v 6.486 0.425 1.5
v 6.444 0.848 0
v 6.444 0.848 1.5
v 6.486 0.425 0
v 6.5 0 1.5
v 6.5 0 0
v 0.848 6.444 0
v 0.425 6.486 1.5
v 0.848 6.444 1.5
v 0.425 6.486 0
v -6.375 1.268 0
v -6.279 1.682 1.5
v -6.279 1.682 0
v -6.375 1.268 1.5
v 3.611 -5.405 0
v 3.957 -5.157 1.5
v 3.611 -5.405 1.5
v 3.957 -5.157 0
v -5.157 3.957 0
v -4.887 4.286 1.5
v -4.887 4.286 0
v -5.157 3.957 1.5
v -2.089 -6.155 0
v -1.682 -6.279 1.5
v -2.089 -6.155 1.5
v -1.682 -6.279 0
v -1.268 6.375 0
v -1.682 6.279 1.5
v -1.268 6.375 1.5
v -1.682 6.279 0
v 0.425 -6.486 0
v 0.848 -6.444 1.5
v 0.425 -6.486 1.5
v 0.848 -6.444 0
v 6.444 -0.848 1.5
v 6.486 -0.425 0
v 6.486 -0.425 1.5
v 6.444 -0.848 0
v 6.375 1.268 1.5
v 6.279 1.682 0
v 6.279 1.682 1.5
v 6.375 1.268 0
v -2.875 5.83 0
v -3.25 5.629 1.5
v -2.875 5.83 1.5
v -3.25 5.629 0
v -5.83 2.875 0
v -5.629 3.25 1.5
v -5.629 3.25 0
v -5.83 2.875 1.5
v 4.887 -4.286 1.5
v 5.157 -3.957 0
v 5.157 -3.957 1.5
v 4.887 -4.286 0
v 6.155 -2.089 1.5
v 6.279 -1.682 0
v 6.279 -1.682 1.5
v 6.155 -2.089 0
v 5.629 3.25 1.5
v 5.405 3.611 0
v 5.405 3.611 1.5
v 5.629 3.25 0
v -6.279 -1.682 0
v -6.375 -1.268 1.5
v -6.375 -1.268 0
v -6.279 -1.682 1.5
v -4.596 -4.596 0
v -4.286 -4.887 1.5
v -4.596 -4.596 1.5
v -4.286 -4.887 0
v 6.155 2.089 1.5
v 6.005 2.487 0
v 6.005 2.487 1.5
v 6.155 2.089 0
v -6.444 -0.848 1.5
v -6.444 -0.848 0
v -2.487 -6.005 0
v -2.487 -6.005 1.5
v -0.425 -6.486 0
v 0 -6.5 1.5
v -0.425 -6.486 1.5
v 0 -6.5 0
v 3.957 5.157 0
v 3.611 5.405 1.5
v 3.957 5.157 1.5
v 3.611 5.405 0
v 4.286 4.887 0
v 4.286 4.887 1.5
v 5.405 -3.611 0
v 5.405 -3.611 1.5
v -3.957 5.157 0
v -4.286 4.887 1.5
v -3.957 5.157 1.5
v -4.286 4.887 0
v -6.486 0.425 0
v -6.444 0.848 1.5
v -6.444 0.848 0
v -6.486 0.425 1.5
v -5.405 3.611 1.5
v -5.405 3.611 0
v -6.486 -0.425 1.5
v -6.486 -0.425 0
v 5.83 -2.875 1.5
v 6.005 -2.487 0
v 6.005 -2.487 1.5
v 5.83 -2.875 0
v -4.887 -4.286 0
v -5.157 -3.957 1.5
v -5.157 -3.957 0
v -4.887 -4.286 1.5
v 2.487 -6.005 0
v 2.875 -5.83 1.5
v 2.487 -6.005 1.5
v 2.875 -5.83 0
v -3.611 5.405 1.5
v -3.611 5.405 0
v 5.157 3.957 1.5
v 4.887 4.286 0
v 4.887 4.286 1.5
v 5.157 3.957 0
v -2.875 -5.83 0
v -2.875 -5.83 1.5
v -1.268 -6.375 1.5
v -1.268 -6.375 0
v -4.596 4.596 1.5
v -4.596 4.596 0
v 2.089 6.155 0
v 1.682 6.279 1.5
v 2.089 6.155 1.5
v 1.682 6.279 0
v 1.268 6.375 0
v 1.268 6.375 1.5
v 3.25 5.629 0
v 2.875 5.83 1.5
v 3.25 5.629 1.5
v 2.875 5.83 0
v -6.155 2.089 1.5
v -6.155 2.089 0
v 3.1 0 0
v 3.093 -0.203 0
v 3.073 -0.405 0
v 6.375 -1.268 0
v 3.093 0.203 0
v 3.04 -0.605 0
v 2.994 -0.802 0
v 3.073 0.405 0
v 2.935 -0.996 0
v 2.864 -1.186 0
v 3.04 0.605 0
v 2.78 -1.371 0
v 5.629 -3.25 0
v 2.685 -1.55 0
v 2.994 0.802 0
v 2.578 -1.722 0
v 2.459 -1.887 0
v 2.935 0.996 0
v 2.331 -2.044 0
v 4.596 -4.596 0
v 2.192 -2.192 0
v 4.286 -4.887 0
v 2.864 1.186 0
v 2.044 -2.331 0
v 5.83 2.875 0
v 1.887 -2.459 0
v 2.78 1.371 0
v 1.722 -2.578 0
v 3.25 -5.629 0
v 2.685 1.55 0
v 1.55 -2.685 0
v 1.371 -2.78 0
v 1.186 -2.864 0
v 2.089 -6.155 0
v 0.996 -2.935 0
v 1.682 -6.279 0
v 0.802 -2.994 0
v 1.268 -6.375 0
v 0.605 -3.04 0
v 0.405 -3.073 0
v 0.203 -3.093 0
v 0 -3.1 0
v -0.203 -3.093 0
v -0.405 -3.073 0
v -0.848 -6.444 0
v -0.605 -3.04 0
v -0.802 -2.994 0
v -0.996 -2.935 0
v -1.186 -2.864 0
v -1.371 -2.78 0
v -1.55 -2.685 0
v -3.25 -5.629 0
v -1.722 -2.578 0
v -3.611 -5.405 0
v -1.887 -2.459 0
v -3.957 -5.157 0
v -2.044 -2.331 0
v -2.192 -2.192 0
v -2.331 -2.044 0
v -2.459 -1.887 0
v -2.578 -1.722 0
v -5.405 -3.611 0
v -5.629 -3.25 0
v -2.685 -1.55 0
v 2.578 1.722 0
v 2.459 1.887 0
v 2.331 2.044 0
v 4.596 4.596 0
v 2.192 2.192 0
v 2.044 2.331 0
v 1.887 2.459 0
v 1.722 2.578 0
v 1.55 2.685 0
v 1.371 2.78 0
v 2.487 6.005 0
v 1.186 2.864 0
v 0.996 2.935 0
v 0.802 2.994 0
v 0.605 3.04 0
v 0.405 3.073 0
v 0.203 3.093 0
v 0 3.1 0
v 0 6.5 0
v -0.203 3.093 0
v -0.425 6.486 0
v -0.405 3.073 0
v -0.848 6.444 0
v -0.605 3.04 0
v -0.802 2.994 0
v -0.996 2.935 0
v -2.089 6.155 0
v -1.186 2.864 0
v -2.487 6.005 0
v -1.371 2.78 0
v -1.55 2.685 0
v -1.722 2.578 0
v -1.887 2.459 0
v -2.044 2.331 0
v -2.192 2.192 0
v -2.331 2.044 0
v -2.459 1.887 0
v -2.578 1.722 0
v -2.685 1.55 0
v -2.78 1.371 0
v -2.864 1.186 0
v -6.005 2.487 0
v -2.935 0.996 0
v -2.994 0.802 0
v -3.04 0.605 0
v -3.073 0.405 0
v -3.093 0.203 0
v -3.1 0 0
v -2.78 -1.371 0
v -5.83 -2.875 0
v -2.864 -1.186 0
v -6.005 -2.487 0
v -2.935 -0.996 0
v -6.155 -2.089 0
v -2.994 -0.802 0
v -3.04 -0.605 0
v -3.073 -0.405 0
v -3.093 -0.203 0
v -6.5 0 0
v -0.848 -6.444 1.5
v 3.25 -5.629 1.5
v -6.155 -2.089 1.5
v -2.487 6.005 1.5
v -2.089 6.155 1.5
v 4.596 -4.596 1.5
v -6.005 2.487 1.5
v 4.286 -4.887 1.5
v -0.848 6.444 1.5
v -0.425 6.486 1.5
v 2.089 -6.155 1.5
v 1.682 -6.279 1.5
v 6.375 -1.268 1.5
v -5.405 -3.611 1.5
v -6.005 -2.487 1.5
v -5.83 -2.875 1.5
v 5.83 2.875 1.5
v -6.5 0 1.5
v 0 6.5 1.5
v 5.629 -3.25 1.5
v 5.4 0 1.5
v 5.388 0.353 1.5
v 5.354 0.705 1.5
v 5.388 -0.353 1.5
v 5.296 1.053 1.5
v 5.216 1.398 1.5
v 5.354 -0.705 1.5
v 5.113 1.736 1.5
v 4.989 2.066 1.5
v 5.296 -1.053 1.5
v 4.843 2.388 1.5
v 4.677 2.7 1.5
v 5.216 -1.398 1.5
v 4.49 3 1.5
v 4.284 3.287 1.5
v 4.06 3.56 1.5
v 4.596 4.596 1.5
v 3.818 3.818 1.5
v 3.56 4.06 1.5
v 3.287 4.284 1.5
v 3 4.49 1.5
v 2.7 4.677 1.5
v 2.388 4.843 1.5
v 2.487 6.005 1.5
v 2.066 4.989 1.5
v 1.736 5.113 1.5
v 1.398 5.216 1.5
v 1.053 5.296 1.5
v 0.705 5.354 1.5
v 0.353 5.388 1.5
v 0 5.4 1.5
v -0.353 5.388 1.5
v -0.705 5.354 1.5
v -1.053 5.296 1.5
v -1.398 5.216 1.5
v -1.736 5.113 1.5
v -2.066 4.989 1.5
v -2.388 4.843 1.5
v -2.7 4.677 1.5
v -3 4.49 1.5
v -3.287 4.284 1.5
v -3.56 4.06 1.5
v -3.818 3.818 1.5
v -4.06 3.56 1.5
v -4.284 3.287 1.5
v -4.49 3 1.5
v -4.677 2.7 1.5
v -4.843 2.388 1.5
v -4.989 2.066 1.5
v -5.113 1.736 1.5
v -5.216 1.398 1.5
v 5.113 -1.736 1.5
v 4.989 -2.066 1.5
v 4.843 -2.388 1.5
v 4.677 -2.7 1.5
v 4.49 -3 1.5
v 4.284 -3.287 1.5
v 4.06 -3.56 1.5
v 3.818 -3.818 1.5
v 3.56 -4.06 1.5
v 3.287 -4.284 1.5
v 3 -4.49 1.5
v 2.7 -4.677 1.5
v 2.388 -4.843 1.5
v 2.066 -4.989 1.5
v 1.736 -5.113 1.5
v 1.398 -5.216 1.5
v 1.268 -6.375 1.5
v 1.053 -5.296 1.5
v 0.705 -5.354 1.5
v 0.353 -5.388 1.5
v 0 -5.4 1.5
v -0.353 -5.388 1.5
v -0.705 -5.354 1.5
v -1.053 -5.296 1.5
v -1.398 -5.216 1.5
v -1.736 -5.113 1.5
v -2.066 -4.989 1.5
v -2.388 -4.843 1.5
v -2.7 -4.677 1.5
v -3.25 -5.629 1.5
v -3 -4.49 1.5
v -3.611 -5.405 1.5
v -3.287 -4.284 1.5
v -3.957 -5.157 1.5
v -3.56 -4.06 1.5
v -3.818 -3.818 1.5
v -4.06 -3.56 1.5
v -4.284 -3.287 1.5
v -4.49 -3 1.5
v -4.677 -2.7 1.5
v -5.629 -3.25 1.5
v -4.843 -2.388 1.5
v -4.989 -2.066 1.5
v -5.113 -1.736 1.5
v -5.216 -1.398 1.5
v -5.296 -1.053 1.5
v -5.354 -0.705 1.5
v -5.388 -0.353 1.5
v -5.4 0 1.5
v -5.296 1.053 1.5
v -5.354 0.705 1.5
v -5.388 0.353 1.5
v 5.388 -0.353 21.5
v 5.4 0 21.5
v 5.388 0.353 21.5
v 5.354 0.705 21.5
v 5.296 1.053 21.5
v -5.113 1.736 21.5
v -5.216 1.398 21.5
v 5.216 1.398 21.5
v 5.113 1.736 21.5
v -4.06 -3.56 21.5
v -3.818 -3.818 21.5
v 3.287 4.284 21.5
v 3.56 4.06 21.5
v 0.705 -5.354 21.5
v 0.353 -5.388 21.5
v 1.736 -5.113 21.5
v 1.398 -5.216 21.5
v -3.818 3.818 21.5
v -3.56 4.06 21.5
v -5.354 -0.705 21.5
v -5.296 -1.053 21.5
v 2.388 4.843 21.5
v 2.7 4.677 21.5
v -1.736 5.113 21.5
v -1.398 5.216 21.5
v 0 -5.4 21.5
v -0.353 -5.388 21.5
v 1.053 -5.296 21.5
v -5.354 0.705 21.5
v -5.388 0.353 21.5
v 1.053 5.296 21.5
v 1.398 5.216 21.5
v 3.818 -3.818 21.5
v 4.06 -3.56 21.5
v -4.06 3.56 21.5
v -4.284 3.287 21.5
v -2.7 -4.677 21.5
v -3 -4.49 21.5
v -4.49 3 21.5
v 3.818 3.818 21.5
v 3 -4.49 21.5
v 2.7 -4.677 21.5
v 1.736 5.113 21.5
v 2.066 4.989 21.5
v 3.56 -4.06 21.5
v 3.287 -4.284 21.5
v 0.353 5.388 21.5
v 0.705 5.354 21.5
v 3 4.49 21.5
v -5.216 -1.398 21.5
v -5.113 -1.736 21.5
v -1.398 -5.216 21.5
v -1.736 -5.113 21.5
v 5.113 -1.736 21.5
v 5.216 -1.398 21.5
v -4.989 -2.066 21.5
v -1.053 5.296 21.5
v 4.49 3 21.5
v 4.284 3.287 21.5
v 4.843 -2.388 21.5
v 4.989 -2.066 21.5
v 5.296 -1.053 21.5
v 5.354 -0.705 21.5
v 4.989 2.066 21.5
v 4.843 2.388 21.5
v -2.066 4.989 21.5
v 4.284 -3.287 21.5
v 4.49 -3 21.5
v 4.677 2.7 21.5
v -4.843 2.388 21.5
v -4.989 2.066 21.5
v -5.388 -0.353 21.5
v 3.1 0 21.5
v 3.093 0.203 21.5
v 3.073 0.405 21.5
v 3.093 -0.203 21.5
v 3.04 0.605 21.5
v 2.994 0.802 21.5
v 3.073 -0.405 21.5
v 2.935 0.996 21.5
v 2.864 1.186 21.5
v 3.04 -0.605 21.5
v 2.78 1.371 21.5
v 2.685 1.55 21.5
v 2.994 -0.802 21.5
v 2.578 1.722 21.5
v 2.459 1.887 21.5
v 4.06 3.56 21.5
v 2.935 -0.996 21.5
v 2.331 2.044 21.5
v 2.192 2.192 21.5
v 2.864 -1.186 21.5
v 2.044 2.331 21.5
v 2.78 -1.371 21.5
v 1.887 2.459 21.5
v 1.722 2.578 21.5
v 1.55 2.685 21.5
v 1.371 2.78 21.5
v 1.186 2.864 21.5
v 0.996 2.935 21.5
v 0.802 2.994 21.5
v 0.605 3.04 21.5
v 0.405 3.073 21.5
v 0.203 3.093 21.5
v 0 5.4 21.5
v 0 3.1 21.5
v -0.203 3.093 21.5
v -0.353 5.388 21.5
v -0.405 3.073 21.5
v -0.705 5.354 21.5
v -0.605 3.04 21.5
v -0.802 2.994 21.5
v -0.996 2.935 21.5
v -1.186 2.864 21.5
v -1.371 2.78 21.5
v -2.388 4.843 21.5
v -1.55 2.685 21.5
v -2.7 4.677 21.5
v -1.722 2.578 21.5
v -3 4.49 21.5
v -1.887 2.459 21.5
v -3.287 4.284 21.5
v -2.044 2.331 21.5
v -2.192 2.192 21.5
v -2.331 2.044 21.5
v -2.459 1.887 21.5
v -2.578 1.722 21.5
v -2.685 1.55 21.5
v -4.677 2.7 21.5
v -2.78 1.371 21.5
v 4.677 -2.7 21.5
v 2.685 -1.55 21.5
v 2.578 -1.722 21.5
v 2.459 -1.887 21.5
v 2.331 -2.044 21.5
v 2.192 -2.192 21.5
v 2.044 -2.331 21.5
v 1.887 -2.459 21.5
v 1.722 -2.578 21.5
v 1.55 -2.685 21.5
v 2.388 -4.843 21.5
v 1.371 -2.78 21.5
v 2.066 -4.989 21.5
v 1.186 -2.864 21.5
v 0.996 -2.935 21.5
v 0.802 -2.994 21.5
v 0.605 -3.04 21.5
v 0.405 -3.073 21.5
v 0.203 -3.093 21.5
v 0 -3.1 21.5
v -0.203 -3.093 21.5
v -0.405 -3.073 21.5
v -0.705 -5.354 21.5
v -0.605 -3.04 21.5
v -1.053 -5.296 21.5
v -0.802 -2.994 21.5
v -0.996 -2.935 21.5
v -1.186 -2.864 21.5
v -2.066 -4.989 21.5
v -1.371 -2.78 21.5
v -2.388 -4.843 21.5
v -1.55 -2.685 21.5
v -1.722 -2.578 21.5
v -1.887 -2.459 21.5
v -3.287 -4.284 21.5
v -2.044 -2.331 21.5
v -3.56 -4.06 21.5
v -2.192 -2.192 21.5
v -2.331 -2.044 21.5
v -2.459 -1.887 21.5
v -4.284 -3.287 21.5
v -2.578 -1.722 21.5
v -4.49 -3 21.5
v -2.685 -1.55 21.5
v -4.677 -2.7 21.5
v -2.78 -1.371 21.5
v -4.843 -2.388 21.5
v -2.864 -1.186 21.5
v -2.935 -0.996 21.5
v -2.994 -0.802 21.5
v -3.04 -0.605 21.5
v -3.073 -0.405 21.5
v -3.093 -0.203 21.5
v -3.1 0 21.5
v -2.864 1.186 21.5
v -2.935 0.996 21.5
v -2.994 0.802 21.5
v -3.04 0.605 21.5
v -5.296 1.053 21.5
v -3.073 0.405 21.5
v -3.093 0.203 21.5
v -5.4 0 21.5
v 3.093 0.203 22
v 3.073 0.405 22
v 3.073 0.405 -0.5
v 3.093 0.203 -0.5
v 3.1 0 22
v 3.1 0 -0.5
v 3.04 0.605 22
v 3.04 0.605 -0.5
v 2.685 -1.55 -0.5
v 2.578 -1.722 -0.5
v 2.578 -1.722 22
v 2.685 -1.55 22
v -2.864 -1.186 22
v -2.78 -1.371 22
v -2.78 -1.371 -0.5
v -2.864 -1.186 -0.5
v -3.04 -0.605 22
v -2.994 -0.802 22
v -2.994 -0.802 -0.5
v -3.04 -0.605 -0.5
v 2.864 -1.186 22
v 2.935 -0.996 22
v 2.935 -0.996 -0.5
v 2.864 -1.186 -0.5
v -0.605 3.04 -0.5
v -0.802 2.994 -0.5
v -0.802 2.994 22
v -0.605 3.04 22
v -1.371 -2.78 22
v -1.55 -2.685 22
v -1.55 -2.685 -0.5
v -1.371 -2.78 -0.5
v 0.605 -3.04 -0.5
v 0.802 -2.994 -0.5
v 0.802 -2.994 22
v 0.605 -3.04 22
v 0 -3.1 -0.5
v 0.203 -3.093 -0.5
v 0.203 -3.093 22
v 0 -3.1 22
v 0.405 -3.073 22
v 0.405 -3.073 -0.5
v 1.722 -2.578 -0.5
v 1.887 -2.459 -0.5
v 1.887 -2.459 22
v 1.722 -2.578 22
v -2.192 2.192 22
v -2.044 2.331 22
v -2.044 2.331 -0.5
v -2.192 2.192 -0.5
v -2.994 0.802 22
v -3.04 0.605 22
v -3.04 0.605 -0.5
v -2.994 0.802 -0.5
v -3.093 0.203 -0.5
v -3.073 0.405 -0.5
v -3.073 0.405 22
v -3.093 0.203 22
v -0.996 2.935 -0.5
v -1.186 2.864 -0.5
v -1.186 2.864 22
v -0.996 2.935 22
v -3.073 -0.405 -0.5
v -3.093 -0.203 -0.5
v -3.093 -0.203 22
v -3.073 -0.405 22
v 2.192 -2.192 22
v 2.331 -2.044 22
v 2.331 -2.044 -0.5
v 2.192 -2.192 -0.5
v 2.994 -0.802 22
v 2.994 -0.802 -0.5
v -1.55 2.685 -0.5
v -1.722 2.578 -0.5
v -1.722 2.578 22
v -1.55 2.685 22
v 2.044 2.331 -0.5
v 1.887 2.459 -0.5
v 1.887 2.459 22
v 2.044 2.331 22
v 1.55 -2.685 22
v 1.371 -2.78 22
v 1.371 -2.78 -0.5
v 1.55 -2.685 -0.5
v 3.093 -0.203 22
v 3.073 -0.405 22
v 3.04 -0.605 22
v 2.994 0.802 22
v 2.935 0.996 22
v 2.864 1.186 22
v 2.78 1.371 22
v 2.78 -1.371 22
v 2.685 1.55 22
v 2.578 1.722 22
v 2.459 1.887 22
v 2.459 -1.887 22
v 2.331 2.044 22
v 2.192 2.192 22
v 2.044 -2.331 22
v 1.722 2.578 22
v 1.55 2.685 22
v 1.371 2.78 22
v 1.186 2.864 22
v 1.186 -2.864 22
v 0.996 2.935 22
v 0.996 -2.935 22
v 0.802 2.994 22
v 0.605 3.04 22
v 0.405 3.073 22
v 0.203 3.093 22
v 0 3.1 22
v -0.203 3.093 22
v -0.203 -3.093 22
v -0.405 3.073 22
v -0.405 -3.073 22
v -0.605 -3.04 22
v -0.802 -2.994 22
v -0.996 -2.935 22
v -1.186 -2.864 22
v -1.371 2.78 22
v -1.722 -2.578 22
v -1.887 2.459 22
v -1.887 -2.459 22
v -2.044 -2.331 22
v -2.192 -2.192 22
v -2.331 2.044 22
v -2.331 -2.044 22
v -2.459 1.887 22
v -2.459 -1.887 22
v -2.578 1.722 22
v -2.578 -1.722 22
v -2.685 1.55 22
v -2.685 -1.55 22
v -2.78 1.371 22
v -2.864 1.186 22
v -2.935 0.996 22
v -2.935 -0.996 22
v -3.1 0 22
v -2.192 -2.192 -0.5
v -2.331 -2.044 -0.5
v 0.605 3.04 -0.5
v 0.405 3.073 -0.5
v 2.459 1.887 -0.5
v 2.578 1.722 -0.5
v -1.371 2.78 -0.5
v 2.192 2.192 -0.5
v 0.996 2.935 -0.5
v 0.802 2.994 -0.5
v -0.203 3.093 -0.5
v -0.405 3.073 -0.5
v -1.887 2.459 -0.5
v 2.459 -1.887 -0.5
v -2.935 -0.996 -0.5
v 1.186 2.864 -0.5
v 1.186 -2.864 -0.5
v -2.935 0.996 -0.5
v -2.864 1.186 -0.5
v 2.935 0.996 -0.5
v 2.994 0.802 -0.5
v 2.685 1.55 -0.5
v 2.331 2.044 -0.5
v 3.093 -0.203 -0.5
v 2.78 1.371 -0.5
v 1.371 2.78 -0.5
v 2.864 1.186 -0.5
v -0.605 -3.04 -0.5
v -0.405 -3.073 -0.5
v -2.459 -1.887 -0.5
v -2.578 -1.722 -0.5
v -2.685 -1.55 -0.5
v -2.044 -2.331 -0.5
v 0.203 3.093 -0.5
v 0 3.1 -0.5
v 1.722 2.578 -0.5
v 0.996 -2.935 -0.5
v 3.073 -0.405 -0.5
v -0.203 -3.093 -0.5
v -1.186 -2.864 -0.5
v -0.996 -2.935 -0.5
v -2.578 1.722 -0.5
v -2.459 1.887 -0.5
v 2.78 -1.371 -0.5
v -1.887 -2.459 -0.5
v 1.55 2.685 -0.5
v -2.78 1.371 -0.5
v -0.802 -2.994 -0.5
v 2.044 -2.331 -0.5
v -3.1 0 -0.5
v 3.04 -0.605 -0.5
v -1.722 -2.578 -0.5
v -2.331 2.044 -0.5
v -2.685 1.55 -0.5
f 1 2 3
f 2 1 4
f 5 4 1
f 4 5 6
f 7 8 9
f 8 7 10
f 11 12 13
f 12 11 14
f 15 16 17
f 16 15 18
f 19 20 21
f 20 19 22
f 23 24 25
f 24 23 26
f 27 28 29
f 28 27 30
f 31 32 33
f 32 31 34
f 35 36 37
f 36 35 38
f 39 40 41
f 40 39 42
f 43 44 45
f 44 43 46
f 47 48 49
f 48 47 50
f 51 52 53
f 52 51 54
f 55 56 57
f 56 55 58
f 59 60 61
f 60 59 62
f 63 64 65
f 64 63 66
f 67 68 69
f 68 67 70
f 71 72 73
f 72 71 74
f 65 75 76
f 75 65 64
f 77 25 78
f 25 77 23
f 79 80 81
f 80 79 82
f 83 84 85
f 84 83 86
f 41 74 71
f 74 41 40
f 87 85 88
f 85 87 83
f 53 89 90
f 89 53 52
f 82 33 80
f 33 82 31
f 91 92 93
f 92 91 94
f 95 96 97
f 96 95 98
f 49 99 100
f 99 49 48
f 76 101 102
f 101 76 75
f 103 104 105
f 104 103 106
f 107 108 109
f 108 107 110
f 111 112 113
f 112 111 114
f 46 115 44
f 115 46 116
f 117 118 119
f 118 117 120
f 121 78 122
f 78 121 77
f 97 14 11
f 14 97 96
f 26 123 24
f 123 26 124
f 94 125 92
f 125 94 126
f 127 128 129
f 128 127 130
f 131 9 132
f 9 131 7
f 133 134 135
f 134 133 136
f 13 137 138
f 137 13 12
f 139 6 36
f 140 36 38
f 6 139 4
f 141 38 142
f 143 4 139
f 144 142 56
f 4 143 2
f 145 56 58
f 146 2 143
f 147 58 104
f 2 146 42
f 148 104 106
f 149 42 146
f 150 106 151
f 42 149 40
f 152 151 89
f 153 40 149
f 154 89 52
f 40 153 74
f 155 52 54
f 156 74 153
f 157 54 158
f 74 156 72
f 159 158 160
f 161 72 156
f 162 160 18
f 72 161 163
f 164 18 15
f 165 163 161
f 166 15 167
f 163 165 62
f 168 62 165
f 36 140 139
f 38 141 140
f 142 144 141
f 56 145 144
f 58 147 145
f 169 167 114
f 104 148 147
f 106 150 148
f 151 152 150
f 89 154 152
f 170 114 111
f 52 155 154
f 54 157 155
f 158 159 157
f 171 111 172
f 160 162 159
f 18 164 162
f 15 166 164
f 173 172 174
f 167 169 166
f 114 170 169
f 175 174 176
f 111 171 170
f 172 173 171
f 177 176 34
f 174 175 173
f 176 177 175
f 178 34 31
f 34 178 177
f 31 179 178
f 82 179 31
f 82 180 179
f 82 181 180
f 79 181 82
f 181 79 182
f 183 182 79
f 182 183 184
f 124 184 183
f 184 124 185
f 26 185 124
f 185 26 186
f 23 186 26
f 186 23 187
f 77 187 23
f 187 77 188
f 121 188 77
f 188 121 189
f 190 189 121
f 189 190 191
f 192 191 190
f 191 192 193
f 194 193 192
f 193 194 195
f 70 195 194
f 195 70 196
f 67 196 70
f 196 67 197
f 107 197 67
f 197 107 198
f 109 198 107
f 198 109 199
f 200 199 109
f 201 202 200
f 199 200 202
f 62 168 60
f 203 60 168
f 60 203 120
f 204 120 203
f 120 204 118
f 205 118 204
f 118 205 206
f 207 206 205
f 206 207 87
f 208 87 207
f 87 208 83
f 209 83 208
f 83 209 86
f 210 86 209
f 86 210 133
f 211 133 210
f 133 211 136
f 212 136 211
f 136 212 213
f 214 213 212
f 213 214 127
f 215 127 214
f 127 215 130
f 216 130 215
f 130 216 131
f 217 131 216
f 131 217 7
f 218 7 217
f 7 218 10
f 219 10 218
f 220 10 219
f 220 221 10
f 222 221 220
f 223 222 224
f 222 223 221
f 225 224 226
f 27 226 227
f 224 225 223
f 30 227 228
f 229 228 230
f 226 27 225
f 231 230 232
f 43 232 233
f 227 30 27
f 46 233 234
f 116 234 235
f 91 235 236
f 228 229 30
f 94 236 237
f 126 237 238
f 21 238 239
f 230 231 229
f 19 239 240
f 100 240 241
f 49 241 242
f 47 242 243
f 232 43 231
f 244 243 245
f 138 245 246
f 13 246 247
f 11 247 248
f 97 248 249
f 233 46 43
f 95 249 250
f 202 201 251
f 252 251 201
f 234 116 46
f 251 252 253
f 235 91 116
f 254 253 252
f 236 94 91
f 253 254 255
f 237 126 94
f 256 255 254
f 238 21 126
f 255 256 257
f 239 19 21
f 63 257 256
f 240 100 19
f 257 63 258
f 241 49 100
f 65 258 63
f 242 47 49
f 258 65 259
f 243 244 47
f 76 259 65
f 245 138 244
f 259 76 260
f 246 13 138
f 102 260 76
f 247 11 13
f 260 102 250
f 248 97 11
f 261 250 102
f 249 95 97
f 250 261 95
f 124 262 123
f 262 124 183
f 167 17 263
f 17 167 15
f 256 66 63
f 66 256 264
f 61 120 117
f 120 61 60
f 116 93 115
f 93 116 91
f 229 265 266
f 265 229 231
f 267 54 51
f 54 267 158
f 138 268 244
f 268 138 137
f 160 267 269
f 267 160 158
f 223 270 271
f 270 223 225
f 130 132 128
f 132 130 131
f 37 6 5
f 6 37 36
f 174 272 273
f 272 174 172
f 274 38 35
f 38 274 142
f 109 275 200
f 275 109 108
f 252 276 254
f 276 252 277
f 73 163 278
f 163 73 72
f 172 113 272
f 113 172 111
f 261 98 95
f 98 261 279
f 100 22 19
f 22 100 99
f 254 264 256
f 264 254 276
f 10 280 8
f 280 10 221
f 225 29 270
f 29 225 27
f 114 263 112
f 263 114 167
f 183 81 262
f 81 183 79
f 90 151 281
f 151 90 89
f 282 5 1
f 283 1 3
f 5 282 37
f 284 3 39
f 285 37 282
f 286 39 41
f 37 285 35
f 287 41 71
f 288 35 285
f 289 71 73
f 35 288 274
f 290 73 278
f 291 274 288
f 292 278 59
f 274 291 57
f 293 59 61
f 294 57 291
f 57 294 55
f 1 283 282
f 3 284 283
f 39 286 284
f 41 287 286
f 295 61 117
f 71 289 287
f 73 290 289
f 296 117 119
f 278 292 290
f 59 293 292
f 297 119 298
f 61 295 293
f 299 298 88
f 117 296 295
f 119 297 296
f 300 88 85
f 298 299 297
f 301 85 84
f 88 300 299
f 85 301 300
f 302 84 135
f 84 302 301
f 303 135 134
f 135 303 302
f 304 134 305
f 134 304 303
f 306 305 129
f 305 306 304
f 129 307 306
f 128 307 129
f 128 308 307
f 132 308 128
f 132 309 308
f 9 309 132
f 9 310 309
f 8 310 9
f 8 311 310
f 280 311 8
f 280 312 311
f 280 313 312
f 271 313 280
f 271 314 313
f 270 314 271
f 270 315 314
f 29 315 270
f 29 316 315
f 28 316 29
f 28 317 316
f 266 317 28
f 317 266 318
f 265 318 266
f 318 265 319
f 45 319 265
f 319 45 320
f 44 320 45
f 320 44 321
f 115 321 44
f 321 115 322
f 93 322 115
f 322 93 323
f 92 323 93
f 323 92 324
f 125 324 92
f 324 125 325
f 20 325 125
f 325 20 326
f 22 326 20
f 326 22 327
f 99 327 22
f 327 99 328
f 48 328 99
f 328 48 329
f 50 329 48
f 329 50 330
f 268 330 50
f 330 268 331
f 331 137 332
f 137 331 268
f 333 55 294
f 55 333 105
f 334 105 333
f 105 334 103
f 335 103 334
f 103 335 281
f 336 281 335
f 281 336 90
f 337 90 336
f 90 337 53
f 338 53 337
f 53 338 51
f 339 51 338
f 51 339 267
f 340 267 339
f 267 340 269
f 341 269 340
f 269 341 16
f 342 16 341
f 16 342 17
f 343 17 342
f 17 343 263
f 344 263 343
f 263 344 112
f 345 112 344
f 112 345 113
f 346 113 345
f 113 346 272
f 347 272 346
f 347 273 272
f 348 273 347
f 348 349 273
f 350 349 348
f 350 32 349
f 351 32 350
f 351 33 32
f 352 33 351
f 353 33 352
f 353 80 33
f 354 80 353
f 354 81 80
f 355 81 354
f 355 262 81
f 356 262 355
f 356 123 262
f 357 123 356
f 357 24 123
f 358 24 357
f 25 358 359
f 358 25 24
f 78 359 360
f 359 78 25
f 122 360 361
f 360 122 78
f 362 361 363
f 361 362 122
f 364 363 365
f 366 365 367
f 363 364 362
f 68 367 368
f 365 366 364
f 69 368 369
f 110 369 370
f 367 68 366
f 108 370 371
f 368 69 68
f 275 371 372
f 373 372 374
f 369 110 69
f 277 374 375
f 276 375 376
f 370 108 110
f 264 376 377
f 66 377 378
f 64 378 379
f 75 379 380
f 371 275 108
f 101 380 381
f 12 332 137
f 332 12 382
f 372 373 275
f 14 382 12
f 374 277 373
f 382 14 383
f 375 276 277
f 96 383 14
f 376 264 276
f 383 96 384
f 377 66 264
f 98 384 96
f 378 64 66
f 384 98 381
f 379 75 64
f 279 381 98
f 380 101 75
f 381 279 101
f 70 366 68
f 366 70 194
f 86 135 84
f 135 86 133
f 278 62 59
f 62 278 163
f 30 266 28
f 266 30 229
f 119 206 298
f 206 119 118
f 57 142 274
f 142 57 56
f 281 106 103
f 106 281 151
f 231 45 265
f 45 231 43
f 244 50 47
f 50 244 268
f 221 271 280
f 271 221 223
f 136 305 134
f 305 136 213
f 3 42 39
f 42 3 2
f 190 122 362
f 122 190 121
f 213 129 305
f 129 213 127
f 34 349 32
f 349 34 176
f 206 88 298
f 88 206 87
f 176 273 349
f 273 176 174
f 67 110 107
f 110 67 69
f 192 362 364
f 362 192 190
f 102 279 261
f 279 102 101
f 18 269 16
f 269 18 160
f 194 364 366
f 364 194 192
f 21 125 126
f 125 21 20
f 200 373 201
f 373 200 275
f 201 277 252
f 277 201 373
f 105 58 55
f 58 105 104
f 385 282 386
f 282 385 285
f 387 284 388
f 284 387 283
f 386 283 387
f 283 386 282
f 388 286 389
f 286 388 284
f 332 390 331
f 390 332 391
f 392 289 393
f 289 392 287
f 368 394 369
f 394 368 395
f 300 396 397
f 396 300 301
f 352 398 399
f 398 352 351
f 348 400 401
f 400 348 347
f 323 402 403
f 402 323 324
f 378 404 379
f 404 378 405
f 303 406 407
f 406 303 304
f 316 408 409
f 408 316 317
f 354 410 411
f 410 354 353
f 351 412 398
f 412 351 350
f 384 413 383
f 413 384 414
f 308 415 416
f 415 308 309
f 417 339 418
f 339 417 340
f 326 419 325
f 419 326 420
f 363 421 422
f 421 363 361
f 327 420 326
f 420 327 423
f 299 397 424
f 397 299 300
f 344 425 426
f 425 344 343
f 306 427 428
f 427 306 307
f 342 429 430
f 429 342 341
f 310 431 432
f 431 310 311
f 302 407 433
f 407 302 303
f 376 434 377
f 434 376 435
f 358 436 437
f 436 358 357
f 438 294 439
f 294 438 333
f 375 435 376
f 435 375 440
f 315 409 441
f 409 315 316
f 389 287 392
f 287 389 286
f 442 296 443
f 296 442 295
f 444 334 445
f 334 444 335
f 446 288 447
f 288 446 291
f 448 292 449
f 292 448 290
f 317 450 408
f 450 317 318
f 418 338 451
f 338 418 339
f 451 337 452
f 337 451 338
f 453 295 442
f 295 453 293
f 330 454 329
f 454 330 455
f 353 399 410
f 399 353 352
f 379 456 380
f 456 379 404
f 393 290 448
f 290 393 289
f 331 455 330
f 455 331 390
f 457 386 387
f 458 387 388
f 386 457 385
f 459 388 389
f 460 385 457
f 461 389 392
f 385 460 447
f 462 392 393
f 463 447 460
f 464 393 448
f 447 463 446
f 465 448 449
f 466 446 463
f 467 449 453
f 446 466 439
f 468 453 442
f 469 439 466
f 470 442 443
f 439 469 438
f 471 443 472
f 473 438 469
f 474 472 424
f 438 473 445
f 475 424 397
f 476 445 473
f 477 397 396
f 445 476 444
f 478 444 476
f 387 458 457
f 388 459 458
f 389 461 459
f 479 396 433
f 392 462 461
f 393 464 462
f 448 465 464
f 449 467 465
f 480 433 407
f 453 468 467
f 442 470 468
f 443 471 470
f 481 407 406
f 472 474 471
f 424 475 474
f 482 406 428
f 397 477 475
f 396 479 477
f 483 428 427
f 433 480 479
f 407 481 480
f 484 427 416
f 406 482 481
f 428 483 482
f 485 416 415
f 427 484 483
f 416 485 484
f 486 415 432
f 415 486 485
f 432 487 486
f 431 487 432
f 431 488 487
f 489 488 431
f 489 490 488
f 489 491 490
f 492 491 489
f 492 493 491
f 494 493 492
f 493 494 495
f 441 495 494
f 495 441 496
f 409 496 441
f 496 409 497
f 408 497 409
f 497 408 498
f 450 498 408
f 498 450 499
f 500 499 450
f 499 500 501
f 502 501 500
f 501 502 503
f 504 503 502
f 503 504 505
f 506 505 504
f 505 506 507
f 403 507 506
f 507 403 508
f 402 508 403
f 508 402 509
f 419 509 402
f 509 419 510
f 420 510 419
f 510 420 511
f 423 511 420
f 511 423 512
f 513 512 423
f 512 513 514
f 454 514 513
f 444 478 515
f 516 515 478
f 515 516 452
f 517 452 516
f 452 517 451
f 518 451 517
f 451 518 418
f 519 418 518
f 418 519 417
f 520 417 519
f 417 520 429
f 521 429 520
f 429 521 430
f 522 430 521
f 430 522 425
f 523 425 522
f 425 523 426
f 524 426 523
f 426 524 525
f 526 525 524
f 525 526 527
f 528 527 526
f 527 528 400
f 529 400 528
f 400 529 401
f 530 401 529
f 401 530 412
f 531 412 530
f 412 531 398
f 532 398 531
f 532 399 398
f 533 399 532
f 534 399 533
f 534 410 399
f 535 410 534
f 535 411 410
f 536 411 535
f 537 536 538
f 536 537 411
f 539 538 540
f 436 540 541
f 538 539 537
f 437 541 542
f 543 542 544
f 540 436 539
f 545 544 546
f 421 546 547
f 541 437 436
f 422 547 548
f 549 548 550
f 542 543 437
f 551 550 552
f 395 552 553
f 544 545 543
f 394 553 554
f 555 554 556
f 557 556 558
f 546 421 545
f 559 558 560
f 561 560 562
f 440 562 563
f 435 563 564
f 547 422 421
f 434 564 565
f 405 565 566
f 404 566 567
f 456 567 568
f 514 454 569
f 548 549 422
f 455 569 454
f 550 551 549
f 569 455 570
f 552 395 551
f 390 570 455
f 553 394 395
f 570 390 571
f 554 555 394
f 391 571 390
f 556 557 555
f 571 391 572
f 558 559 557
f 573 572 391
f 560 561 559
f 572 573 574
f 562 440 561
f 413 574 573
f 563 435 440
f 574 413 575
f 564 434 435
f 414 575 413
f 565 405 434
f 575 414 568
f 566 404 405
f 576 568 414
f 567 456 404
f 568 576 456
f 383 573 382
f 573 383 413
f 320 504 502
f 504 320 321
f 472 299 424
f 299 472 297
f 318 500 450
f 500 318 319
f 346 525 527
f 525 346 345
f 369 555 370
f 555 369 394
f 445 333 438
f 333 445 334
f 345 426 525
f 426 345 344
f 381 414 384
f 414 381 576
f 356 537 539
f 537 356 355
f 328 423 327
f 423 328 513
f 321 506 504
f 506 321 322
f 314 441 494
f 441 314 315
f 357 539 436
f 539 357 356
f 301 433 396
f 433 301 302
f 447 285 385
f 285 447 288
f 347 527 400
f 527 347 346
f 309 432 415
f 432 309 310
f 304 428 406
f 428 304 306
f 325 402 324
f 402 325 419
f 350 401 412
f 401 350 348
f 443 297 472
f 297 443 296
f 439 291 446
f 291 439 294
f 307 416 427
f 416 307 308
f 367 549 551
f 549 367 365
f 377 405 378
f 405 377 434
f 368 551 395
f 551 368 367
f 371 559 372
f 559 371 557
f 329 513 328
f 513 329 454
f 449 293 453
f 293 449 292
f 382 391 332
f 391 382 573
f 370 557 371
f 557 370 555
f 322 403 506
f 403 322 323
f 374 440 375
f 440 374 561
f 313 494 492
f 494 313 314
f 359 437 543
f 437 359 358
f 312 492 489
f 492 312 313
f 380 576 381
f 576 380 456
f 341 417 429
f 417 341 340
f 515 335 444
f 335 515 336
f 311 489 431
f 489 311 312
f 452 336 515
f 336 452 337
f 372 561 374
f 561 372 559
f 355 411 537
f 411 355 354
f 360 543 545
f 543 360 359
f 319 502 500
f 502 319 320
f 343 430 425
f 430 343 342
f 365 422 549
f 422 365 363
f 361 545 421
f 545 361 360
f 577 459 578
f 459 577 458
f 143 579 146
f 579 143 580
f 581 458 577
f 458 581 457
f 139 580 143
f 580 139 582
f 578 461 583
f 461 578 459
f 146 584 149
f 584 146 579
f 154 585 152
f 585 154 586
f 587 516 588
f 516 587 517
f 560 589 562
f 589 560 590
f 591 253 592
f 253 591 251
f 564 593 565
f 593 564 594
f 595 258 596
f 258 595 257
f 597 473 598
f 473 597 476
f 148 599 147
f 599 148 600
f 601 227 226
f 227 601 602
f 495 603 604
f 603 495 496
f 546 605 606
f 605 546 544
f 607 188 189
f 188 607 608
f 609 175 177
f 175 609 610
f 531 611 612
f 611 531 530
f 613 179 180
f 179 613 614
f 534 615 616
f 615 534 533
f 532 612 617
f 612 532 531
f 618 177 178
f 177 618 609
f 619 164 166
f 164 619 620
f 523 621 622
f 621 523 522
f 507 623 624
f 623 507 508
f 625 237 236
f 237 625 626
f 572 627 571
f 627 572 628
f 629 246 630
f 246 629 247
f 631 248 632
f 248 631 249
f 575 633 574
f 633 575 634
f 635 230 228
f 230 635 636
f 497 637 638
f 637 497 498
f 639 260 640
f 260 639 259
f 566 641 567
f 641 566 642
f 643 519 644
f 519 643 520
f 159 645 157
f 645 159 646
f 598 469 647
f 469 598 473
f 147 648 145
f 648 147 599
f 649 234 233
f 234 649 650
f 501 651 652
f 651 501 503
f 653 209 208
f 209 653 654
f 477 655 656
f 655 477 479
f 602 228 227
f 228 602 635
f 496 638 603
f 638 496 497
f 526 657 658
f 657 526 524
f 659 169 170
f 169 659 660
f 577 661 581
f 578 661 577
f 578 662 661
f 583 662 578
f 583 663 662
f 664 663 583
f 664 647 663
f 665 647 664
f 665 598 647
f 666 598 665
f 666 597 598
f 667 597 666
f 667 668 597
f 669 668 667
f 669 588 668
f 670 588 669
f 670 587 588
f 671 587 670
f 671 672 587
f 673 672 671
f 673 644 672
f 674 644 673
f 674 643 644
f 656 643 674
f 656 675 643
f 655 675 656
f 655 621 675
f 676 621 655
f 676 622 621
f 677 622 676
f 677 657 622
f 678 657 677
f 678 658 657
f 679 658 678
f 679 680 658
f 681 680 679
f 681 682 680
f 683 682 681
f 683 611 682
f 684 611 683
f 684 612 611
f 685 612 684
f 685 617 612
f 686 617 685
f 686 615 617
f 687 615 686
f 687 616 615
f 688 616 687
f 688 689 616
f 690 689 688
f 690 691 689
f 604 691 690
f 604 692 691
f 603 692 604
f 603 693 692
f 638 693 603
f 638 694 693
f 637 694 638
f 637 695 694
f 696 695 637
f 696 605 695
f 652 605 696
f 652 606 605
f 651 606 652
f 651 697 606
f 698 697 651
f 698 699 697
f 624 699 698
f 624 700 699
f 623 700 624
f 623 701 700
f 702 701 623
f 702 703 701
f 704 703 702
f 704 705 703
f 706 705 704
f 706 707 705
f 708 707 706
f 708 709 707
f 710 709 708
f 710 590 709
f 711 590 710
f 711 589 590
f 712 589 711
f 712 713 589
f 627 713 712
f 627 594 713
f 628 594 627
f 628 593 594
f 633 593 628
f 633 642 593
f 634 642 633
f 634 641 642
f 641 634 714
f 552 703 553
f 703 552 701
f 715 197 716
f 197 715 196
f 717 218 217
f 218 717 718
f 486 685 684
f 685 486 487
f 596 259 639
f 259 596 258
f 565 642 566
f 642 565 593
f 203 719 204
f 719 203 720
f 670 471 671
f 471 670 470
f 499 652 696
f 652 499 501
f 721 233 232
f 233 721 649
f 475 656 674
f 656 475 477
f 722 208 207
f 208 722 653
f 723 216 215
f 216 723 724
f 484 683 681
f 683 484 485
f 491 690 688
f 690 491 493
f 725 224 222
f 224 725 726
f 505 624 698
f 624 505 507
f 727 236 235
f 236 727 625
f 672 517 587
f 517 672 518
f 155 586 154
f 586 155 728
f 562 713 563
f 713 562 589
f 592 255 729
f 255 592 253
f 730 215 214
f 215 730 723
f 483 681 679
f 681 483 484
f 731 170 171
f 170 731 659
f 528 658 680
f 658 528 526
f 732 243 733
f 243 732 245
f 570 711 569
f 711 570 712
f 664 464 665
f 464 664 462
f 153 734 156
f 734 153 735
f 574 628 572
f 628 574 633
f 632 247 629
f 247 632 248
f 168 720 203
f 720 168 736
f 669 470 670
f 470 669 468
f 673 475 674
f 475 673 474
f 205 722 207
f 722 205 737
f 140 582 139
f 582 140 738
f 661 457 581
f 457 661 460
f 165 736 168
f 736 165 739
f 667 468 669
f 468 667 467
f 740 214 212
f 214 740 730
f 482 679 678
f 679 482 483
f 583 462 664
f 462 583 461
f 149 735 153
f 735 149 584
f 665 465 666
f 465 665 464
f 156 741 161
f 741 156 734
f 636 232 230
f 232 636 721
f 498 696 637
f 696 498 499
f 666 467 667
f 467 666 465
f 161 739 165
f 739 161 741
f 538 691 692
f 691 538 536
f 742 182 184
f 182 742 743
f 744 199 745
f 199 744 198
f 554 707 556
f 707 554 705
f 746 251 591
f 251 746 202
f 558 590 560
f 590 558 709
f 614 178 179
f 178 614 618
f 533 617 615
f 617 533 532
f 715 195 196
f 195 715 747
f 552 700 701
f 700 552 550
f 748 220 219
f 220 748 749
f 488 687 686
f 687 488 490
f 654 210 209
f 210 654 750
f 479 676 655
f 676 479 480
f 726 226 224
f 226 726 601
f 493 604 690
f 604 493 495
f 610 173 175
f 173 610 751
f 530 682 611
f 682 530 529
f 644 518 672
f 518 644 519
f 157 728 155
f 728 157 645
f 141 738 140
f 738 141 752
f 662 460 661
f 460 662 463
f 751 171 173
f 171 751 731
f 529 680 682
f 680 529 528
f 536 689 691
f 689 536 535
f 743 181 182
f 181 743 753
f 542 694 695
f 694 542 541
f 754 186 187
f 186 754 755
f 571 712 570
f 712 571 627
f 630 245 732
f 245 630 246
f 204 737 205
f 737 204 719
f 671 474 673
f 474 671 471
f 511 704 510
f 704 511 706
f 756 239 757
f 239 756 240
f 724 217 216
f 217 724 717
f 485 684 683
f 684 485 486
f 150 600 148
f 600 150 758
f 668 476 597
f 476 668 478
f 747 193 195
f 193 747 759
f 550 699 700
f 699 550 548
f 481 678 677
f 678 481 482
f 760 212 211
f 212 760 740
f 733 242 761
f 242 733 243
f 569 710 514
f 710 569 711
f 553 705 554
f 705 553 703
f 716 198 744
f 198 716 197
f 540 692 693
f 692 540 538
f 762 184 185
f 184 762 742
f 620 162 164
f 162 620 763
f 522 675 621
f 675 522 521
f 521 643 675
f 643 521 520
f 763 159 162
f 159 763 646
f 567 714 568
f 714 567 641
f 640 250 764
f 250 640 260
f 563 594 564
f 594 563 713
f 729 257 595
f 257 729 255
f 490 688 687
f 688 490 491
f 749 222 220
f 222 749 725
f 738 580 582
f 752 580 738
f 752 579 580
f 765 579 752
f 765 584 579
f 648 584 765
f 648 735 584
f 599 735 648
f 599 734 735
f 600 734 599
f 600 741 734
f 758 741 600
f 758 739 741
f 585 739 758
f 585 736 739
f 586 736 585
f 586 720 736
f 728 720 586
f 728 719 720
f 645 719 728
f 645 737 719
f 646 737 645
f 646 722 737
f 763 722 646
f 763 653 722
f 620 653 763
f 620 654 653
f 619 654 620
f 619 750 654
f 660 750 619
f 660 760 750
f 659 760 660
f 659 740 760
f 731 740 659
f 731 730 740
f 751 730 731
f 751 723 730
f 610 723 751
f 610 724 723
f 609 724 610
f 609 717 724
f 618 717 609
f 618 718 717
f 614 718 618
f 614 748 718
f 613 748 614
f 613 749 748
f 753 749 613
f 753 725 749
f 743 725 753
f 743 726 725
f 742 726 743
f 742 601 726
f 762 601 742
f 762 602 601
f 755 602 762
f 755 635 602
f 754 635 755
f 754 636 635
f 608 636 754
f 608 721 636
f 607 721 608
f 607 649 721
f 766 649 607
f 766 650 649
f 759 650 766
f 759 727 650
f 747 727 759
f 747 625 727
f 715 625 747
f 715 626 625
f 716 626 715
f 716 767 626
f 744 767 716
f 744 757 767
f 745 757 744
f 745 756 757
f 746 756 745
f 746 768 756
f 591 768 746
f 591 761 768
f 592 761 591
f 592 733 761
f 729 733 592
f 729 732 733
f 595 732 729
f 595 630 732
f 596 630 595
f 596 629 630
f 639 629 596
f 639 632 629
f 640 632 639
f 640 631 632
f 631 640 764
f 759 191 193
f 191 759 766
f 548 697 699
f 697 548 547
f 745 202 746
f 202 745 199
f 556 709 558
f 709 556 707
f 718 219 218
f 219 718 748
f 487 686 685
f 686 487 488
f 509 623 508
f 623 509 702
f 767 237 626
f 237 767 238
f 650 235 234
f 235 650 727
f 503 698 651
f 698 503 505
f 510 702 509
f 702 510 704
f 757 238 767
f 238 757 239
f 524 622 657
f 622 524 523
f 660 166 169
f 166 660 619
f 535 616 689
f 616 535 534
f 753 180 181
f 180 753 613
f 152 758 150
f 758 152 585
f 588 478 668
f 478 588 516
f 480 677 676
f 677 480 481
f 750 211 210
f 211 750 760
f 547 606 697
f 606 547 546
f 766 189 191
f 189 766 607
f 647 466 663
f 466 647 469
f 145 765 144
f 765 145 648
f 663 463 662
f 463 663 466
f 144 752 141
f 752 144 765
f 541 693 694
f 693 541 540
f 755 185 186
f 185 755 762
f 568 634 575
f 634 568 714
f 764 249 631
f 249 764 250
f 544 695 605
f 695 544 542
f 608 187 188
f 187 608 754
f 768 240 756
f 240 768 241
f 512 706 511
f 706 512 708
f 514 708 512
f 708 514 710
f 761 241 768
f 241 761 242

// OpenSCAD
// PCR tube adapter sleeve: collar (13 mm) + tube sleeve (10.8 mm OD) with 6.2 mm bore
// Print orientation: collar on bed (z = 0), sleeve body rises to z = 21.5

// ---- Dimensions (mm) ----
collar_d        = 13;    // collar outer diameter
collar_t        = 1.5;   // collar thickness (z = 0 to 1.5)
sleeve_od       = 10.8;  // sleeve outer diameter
sleeve_h        = 20;    // sleeve body height above collar (z = 1.5 to 21.5)
bore_d          = 6.2;   // straight through-bore diameter
eps             = 0.5;   // cutter overshoot past faces

$fn = 96;

// ---- Model ----
union() {
    // Collar: cylinder 13 mm diameter, 1.5 mm height
    cylinder(d = collar_d, h = collar_t);

    // Sleeve body: cylinder 10.8 mm diameter, 20 mm height, centred on origin in X/Y
    translate([0, 0, collar_t])
        cylinder(d = sleeve_od, h = sleeve_h);
}

// Through-bore: extends past both ends so no faces are coplanar
translate([0, 0, -eps])
    cylinder(d = bore_d, h = collar_t + sleeve_h + 2 * eps);
